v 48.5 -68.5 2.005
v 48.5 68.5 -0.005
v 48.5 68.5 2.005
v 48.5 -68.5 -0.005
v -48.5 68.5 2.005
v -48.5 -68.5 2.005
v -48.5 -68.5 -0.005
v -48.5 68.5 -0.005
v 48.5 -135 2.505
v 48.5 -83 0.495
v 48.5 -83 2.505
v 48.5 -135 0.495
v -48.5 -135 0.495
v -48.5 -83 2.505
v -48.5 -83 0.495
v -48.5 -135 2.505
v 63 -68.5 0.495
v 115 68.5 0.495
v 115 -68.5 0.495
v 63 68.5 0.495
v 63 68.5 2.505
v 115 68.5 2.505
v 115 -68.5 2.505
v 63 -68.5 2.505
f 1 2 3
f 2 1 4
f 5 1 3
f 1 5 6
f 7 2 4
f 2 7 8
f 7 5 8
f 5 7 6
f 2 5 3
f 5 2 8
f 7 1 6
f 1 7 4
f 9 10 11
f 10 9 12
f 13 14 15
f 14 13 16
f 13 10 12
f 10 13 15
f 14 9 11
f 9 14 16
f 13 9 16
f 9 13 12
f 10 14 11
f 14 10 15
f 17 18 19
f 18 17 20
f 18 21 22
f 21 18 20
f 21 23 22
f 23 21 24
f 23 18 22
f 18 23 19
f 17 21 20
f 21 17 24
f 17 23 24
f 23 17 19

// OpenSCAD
//flat(4);
//center_pattern(1, 4);

center(4);

//build();

//box
bx=110;
by=150;
bh=60;

be=2.5; //espessura
bm=4; //margem
bb=bm+be; //margem

ce=2; //espessura centro


//number of doves
nx=5;
ny=5;
nh=3;

//Afastamento lateral
bmarg = 20; //xy
bmargh = 16; //z

//dove
db=5; //base
dt=6.5; //topo
dh=be; //height
dsup=4;

//lock
lh=be; //height
lp=1.2; //profundidade
ls=.4; //slack
la=.2; //topo


//dovebase
dbb=20; //base
dbt=20; //topo
dbh=dh; //height
dbd=3.6;



//variaveis
bx2 = bx/2;
by2 = by/2;
bh2 = bh/2;
ang = atan2(dh, (dt-db)/2);
lss = sqrt(pow(dh,2) + pow((dt-db)/2, 2));



AA=.01;

module side2(){
    base_form([by-2*dh, bh, be], bm, bm);
    
    mirrorh()
    translate([-by2+dh,0,0])
    rotate([0,0,90])
    dovesup();
    
    t = (by - bmarg) / (ny -1);
    n = (ny -1)/2;
    
    mirrorx_line(t, n, [1,0,0], [1,0,0]) 
    translate([0,bh2,0])
    rotate([0,0,0])
    dovesup();
   
}

module side1(){
    difference(){
        base_form([bx, bh, be], bb, bm);
        
        mirrorh()
        translate([bx2,0,0])
        rotate([0,0,90])
        dove(ls);
    }
    /*
    mirrorh()
    translate([bx2,0,0])
    rotate([0,0,90])
    dovebase();
    */
    
    
    t = (bx - bmarg) / (nx -1);
    n = (nx -1)/2;
    mirrorx_line(t, n, [1,0,0], [1,0,0]) 
    translate([0,bh2,0])
    dovesup();
}

module base(){
    difference(){
        base_form([bx, by, be], bb, bb);
        
        mirrorx()
        translate([0,-by2,0])
        rotate([0,0,0])
        dove(ls);
        
        mirrory()
        translate([bx2,0,0])
        rotate([0,0,90])
        dove(ls);
    }
    /*
    mirrorx()
    translate([0,-by2,0])
    dovebase();
    
    mirrory()
    translate([bx2,0,0])
    rotate([0,0,90])
    dovebase();
    */
}

module mirrory(){
    t = (by - bmarg) / (ny -1);
    n = (ny -1)/2;
    
    mirrorx_line(t, n, [1,0,0],  [0,1,0]) children();
    mirror([0,1,0])
    mirrorx_line(t, n, [1,0,0],  [0,1,0]) children();
}

module mirrorh(){
    t = (bh - bmargh) / (nh -1);
    n = (nh -1)/2;
    
    mirrorx_line(t, n, [1,0,0],  [0,1,0]) children();
    mirror([0,1,0])
    mirrorx_line(t, n, [1,0,0],  [0,1,0]) children();
}

module mirrorx(){
    t = (bx - bmarg) / (nx -1);
    n = (nx -1)/2;
    
    mirrorx_line(t, n, [0,1,0], [1,0,0]) children();
    mirror([1,0,0])
    mirrorx_line(t, n, [0,1,0], [1,0,0]) children();
}

module mirrorx_line(t, n, v, tv){
    for(i = [0: n]){
        translate(i*t * tv)
        children();
        
        
        mirror(v)
        translate(i*t*tv)
        children();
    }
}

module base_form(v, bm, bb){
    difference(){
        translate([0,0,v[2]*1/2])
        cube(v, center=true);
        
        center_form(v, bm, bb);
    }
}

module center_form(v, bm, bb){
    b = 2*bm;
    bx = 2*bb;
    
    translate([0,0,v[2]*1/2])
    cube(v + [-b, -bx, +AA], center=true);
}


module dovesup(){
    difference(){
        translate([0,lh,0])
        rotate([90,0,0])
        dove(0);
    
        translate([0,lh/2,-db/2])
        cube([db*2, lh, db], center=true);
    }
    
    
    /*
    translate([0,0,0])
    rotate([90,0,-90])
    linear_extrude(db, center=true)
    polygon([[0,0], [0, dh], [dsup, 0]]);
    */
}



module dove(ff){
    
            dovef();
            lockf(ff);
            mirror([1,0,0]) lockf(ff);
        
        
    
    
}



module dovebase(){
    b = dbb/2;
    c = dbt/2;
    dh = dbh;
    difference(){
        
        translate([0,dbd,0])
        rotate([90,0,0])
        linear_extrude(dbd)
        polygon([[-b,0], [-c, dh], [c, dh], [b, 0]]);
        
        dove(ls);
    }
}

module lockf(ff){
    b = lh/2;
    c = la/2;
    dh=lp;
    
    translate([db/2,0,b])
    rotate([0,-90,ang+180])
    linear_extrude(lss)
    polygon([[-b-ff,0], [-c-ff, dh+ff], [c+ff, dh+ff], [b+ff, 0]]);
}

module dovef(){
    b = db/2;
    c = dt/2;
    linear_extrude(lh)
    polygon([[-b,0], [-c, dh], [c, dh], [b, 0]]);
}


module flat_s1(ma){
    translate([0, -by2-bh2 - ma,be]) 
    rotate([0,180,0])
    children();
}
module flat_s2(ma){
    translate([bx2 + bh2 + ma, 0,be])
    rotate([0,180,90])
    children();
}

module flat(ma=10) {
    
    base();
    flat_s1(ma) 
      side1();
    flat_s2(ma) 
      side2();
    
}



module build() {
    base();
    
    translate([0, -by/2,bh2+dh])
    rotate([-90,0,0])
    side1();
    
    translate([bx2, 0,bh2+dh])
    rotate([-90,0,90])
    side2();
}

module center(ma) {
    center_form([bx, by, ce], bb, bb);
    flat_s1(ma) center_form([bx, bh, ce], bb, bm);
    flat_s2(ma) center_form([by-2*dh, bh, ce], bm, bm);
}

module center_pattern(file, ma) {
    pos = [0,-100,-50];
  
    texture(file,pos, 100) 
      center_form([bx, by, ce], bb, bb);
  
    flat_s1(ma)
      texture(file,pos, 100) 
      center_form([bx, bh, ce], bb, bm);
  
    texture(file,pos, 100) 
      flat_s2(ma) 
      center_form([by-2*dh, bh, ce], bm, bm);
}

module texture(t, pos, e){
  difference(){
    children();
    translate(pos)
      
    linear_extrude(e)
      import(file = str("lib/patterns/", t, ".dxf"));
  }
}




;
